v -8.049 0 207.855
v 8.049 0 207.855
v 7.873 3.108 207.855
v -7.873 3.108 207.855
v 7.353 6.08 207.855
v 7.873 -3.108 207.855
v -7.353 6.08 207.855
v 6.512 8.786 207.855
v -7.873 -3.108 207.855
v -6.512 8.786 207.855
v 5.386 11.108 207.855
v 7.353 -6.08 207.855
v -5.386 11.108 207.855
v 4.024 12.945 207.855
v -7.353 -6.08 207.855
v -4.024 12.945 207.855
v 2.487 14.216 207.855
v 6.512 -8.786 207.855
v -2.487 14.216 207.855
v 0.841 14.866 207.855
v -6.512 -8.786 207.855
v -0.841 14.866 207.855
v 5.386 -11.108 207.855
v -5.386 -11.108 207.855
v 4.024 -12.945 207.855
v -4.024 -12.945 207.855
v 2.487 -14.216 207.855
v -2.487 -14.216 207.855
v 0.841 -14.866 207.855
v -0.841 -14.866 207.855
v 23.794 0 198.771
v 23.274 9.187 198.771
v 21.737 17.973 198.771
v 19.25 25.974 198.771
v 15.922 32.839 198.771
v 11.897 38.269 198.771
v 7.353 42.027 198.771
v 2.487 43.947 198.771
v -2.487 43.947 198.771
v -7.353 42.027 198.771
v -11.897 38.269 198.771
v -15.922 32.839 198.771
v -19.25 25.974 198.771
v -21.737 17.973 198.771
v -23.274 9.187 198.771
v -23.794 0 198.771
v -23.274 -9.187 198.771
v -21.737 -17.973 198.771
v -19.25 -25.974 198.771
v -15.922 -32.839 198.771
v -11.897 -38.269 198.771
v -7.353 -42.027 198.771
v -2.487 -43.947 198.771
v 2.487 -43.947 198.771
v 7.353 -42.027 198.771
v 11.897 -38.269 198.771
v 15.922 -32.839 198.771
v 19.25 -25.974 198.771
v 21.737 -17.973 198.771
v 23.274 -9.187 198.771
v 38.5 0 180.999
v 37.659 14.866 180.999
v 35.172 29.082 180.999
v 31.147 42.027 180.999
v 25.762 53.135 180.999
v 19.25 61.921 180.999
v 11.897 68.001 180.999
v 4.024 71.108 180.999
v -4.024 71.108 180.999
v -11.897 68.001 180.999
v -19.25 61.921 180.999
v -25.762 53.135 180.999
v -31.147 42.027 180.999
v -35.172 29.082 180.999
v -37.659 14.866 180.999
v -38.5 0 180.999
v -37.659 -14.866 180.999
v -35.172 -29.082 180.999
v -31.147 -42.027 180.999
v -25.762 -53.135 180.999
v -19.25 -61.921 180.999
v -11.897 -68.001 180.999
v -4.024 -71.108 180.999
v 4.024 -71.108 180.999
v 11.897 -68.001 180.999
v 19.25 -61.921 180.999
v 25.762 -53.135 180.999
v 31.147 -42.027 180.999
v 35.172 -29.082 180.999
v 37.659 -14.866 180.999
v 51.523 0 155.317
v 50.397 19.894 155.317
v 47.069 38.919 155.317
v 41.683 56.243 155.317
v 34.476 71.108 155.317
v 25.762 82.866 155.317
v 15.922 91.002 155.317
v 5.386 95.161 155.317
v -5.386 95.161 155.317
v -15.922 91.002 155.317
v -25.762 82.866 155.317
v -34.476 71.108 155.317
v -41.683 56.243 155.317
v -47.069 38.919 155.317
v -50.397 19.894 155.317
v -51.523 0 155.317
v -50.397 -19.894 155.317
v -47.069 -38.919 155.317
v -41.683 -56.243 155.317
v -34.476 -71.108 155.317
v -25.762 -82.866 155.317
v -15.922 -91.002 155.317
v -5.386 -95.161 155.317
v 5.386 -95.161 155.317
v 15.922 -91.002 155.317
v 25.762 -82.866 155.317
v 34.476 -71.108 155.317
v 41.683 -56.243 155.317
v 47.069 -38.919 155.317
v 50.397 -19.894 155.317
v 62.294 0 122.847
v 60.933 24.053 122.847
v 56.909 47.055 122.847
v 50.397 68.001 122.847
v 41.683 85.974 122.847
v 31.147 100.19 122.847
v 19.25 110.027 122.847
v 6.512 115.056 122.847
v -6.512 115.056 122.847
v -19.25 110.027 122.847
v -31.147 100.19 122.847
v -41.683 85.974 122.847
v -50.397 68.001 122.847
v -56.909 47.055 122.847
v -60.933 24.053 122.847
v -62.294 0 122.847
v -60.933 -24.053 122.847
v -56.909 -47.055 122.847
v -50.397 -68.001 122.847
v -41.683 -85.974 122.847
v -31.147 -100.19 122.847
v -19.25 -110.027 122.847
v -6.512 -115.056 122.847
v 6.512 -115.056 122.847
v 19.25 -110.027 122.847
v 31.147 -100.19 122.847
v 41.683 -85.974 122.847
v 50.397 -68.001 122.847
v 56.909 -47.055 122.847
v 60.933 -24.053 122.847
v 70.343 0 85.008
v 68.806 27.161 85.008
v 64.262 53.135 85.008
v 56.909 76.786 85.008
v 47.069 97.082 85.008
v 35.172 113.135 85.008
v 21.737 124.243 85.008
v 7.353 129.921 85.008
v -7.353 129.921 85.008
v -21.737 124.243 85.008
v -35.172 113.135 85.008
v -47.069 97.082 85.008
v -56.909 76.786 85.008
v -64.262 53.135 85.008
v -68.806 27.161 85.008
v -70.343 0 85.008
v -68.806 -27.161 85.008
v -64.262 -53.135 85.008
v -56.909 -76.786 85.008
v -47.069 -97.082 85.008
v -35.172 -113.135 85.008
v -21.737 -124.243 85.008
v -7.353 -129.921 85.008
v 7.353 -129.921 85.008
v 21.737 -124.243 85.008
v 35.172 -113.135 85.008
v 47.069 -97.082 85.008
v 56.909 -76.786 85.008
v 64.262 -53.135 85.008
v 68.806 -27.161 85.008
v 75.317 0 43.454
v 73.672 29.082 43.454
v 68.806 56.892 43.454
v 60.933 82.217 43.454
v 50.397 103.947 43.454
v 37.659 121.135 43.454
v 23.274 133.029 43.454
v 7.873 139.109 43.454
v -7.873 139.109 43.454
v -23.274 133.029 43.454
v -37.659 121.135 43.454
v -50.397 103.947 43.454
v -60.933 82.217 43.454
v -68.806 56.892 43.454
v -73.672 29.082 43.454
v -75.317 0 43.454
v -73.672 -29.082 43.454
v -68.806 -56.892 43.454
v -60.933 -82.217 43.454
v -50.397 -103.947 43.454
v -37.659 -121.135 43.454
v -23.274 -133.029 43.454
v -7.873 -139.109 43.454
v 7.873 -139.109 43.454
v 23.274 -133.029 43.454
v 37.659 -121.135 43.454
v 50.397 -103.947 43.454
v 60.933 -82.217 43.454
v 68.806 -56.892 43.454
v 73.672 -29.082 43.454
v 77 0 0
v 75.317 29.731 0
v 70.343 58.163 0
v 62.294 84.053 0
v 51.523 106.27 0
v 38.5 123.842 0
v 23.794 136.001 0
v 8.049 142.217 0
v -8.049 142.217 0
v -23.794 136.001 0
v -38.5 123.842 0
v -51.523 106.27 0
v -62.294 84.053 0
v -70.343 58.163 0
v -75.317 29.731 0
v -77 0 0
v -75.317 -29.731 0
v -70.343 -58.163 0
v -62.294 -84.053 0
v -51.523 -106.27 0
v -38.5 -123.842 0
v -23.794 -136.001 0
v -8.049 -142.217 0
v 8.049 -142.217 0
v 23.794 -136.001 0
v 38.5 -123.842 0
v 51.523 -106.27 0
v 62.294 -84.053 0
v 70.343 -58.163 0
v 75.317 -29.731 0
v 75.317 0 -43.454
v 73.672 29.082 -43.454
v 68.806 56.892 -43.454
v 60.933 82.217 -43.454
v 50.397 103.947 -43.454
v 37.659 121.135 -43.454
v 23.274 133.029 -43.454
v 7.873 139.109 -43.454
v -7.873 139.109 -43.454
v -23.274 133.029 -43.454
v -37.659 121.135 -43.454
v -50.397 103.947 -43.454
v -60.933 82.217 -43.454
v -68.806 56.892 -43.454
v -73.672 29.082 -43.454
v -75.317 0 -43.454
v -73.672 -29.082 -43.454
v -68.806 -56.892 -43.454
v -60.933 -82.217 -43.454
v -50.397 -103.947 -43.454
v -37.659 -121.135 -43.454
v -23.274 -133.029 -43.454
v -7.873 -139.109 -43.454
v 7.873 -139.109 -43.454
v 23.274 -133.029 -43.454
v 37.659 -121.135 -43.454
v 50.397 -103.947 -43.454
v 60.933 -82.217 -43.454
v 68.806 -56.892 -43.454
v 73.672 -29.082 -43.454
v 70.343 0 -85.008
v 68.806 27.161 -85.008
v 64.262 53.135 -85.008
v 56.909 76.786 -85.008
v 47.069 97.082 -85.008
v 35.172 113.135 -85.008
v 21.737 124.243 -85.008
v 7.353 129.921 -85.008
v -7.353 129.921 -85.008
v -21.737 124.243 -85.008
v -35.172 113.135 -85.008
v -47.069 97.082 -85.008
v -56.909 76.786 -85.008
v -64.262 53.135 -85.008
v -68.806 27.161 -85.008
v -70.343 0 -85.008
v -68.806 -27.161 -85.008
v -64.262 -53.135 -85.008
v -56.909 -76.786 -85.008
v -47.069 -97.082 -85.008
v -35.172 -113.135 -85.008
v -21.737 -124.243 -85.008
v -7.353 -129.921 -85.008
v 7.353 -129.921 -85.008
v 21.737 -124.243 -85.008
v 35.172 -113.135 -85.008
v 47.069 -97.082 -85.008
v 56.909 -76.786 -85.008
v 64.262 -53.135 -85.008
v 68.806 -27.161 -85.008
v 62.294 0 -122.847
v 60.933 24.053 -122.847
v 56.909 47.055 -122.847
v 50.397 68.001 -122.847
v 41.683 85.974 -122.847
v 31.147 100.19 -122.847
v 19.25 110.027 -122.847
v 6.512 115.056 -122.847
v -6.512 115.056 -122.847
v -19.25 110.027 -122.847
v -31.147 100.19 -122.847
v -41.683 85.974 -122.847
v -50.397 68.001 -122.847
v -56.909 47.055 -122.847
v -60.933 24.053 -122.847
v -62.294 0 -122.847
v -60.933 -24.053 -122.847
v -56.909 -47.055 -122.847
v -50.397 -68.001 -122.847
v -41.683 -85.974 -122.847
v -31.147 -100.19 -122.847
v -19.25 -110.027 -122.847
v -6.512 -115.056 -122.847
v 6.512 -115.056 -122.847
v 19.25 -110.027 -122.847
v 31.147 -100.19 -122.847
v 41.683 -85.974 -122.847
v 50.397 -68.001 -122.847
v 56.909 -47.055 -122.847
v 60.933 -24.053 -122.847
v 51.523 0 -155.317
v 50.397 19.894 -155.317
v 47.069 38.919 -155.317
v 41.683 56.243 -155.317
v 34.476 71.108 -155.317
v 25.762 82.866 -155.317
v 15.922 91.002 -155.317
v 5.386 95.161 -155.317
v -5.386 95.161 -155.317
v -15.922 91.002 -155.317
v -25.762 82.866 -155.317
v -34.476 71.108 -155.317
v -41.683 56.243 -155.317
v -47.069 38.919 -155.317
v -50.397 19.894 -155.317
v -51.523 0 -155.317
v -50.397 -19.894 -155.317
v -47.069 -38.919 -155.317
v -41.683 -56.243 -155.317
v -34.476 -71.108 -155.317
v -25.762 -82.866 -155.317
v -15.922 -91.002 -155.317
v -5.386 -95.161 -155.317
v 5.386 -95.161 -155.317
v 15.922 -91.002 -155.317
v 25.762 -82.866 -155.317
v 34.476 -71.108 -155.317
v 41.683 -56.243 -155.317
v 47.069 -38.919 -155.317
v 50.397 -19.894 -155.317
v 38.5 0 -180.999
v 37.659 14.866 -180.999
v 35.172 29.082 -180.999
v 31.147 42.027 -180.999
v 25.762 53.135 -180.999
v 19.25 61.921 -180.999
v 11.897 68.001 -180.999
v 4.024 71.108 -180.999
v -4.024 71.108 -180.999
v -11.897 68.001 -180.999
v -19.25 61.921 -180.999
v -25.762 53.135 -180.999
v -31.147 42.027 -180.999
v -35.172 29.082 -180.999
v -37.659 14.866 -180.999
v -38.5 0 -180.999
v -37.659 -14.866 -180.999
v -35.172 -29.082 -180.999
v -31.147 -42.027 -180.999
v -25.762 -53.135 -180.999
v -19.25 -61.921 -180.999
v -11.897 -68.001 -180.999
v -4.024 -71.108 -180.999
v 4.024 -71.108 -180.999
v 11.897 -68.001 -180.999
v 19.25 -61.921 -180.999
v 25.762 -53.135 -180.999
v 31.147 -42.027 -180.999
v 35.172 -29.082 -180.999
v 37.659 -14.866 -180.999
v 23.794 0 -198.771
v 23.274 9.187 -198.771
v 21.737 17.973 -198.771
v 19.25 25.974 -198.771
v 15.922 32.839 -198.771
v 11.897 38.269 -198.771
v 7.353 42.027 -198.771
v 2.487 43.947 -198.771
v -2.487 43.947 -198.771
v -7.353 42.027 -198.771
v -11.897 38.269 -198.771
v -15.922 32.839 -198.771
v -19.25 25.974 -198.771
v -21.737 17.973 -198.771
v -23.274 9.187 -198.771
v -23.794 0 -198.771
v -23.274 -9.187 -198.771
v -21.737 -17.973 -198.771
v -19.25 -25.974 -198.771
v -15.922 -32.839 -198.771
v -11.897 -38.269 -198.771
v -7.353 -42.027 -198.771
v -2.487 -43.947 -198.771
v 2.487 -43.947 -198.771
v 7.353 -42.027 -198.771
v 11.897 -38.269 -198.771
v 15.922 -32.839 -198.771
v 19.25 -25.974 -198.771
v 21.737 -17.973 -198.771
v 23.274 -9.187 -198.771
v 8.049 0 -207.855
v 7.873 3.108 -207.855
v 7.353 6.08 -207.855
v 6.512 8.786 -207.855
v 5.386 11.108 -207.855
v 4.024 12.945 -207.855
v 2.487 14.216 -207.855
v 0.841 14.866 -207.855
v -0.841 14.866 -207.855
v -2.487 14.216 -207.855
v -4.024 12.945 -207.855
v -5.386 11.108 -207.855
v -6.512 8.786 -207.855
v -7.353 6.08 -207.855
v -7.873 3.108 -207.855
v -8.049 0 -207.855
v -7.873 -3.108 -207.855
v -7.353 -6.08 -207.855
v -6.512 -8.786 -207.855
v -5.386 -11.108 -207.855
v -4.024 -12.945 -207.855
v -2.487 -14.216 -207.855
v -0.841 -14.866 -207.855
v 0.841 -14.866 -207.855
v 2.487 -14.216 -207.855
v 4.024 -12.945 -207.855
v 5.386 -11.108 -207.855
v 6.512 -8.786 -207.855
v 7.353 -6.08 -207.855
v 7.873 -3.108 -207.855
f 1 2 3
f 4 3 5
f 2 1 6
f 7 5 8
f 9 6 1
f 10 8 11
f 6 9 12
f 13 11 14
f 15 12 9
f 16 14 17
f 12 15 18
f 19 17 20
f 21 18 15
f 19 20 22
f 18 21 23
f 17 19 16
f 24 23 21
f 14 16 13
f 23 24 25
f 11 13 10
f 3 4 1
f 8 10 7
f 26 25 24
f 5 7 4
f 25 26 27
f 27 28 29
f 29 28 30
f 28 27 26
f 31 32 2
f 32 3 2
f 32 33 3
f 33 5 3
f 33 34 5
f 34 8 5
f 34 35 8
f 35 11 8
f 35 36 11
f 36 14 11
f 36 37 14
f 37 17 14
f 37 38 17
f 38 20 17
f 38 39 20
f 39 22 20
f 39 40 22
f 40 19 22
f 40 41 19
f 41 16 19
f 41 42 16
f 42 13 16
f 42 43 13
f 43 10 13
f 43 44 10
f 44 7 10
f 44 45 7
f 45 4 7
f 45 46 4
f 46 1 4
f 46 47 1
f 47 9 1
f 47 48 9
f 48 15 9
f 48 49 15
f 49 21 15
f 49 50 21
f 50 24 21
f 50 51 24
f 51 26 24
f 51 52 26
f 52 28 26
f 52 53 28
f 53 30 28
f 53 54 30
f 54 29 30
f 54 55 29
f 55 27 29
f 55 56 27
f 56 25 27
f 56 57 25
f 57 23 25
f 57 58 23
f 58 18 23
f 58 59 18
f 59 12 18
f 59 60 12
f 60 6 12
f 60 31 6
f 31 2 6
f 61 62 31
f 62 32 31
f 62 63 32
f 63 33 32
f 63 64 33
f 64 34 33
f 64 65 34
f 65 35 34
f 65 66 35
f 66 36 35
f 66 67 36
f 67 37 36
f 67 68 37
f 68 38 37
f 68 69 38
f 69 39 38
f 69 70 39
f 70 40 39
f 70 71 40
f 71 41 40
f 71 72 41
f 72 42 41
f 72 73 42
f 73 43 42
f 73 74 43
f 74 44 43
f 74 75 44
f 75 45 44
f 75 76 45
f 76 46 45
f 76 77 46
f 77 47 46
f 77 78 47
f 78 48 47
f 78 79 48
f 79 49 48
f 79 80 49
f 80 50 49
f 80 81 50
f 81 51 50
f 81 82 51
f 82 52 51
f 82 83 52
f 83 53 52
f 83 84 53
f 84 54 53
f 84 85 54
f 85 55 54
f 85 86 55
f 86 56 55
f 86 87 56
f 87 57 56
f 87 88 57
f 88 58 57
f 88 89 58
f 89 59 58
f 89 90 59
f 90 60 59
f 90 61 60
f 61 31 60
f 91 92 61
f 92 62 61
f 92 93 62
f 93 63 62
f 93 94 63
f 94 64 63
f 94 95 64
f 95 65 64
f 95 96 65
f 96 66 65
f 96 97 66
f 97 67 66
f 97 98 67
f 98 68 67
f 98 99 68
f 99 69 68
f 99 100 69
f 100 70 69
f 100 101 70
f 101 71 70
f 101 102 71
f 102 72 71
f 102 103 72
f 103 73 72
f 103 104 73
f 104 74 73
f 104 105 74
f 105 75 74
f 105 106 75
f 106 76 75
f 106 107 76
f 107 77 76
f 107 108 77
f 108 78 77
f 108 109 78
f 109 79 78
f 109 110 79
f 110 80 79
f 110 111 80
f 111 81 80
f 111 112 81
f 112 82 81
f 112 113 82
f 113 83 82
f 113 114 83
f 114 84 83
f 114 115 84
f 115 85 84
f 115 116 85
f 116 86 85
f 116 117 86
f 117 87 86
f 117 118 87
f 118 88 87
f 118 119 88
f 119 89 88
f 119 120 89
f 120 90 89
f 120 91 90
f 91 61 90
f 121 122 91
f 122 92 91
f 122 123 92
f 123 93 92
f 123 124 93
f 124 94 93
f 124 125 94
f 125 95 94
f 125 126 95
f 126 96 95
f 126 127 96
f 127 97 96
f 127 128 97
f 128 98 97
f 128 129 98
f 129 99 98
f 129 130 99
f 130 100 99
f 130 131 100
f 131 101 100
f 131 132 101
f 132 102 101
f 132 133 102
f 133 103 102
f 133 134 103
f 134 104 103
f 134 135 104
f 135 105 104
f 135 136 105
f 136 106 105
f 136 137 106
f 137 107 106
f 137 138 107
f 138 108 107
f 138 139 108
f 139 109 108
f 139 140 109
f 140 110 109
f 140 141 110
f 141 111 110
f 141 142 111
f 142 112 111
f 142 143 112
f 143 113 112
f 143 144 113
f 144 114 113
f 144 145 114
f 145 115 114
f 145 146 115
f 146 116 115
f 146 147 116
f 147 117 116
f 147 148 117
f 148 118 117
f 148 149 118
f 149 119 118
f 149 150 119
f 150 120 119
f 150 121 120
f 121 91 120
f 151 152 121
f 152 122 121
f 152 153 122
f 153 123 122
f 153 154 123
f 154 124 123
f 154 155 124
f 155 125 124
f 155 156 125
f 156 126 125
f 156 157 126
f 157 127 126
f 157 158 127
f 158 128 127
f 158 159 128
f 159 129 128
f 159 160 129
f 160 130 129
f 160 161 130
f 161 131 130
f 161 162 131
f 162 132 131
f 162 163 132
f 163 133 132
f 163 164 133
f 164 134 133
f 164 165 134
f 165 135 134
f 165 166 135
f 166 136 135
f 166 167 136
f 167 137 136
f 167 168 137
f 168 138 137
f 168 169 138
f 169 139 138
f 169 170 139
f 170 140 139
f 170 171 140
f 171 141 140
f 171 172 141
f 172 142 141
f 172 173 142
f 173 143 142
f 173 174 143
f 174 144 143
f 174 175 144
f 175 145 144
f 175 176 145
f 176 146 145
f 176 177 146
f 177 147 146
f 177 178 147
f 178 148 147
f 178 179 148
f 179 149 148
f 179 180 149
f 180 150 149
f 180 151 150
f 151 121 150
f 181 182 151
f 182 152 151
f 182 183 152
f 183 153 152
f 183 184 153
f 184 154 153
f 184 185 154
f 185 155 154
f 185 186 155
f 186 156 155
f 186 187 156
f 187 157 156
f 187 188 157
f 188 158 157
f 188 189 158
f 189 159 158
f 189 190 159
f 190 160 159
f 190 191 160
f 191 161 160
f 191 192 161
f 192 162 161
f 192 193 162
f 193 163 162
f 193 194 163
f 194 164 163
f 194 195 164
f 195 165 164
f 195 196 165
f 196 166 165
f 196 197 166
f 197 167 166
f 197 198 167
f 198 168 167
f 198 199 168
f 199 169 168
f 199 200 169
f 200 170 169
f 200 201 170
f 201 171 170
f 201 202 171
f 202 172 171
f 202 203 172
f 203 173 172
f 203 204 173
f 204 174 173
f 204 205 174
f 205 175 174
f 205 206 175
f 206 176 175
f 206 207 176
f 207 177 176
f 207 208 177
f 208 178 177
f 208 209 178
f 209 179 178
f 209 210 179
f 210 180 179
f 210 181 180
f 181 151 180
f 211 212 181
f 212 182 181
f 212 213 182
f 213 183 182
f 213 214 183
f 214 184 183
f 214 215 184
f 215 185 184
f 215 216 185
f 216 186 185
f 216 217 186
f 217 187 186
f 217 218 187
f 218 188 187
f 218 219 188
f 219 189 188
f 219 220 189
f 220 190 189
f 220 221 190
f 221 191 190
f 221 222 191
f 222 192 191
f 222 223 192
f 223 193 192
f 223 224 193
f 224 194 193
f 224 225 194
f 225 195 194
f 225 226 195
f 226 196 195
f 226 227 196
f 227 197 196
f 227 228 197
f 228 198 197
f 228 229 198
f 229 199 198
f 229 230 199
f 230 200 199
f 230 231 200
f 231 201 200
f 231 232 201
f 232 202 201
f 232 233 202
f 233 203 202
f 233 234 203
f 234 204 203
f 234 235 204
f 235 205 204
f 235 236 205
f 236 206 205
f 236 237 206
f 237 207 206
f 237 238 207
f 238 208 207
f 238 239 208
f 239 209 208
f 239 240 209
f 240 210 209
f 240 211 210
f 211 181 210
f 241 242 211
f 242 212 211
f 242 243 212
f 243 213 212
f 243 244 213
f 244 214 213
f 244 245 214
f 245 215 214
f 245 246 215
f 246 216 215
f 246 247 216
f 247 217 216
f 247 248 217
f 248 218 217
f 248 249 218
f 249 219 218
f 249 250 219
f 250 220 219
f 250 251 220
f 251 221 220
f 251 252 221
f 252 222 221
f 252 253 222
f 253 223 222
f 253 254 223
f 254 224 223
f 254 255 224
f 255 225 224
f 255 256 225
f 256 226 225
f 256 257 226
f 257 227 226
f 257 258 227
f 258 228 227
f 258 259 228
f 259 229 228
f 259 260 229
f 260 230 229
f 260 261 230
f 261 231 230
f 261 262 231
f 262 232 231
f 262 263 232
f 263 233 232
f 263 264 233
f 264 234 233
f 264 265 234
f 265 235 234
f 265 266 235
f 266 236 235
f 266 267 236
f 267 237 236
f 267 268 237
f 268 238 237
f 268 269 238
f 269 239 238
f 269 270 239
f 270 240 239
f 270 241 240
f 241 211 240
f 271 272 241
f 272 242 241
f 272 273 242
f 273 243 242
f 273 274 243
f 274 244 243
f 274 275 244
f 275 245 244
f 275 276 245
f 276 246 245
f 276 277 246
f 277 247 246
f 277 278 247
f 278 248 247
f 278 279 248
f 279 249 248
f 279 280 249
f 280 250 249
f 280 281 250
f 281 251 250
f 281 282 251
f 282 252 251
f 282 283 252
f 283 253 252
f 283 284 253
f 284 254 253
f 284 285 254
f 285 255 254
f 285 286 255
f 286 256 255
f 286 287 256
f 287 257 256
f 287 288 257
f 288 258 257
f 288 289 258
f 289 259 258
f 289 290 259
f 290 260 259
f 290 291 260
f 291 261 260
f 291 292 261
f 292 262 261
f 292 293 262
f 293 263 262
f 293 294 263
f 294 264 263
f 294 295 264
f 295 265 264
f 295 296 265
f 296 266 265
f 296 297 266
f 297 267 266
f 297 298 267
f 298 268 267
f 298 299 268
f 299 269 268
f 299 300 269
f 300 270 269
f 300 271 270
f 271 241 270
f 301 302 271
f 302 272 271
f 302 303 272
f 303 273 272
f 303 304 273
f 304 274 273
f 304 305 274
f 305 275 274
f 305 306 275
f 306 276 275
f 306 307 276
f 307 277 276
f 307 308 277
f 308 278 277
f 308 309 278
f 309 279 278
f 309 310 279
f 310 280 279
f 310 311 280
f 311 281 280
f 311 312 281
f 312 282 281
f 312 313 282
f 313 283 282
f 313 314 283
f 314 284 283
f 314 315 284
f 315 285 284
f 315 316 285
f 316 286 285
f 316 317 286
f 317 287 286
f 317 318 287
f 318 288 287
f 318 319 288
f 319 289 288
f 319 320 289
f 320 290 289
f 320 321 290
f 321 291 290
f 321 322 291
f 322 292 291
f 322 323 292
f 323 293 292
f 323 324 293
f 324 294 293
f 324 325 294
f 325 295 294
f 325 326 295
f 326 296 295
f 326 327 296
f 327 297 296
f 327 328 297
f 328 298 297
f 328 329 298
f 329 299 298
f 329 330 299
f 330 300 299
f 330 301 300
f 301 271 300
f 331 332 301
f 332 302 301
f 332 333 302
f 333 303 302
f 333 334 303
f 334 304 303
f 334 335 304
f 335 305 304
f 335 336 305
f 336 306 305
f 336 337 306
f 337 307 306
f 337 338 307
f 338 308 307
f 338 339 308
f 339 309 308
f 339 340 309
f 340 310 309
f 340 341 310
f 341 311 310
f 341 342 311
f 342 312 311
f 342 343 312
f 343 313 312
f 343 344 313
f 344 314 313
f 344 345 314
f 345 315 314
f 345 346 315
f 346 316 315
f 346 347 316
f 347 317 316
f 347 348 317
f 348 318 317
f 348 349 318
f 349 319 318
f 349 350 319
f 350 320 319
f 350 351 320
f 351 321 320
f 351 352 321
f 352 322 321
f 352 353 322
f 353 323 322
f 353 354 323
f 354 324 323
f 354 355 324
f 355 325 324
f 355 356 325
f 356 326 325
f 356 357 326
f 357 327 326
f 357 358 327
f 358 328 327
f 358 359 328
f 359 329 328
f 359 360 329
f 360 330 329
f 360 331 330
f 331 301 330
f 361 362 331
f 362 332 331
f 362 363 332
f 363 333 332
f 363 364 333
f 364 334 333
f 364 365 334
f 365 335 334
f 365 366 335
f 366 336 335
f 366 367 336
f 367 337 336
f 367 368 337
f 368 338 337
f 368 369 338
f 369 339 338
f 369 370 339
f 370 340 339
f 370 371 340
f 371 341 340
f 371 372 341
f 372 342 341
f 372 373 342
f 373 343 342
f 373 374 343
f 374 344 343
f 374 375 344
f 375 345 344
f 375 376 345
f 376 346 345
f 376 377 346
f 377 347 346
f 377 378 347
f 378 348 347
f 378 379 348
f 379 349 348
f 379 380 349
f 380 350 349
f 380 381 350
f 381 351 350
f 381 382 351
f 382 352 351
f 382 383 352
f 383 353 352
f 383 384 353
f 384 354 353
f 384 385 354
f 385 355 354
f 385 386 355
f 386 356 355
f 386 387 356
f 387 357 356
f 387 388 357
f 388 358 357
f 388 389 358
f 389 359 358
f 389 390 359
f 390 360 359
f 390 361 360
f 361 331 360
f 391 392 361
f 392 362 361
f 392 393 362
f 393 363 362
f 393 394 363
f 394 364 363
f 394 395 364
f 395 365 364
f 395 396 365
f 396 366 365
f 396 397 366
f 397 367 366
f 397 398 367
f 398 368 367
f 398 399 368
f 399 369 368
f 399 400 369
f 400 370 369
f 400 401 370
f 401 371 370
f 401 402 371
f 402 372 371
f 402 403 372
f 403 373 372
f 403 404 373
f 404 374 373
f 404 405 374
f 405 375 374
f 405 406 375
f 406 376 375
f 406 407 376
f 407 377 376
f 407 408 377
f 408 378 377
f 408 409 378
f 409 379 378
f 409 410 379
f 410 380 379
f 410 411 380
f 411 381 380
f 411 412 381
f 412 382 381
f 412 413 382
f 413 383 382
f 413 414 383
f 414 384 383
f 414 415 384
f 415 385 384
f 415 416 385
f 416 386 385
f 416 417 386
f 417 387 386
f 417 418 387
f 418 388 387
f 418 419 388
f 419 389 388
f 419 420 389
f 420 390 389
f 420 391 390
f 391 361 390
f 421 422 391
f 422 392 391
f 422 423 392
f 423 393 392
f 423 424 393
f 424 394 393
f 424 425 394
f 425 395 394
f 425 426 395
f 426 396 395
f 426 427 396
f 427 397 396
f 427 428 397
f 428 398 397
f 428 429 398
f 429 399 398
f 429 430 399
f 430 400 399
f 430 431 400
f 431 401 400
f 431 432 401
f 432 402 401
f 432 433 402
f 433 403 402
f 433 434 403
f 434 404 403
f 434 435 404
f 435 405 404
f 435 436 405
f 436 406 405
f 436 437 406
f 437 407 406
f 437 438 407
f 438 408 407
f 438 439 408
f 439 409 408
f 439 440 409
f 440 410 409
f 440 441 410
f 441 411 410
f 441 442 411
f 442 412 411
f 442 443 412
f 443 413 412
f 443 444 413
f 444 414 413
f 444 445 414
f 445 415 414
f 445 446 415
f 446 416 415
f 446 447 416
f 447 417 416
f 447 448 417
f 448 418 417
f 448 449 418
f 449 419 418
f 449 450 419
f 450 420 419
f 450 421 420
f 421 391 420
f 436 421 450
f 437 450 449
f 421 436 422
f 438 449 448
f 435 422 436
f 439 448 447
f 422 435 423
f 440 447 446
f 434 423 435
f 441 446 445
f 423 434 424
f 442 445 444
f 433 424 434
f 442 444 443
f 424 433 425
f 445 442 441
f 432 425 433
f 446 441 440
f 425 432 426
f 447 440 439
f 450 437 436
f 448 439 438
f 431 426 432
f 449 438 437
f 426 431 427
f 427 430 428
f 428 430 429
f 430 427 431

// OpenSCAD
// Generated by SolidPython 1.0.1 on 2020-07-29 00:46:47


scale(v = [7, 13, 19]) {
	sphere(r = 11);
}
/***********************************************
*********      SolidPython code:      **********
************************************************
 
# import packages: SolidPython
from solid import *
from solid.utils import *
from itertools import chain, combinations, permutations


class Resize:

    def __init__(self, scad_file):
        self.scad_file = scad_file
        #self.scad_file = import_scad(scad_file)
        # cone/cylinder param:
        self.r1 = 0
        self.r2 = 0
        self.h = 0
        # rectangular prism param:
        self.w = 0
        self.l = 0
        # ellipse param:
        self.r = 0

    # import OpenScad code (file name corresponds to shape)


    # classify shape + parameters
    def assign(self, param1, param2, param3):
        if self.scad_file == 'cone.scad':
            self.r1 = param1
            self.r2 = param2
            self.h = param3
        elif self.scad_file == 'cylinder.scad':
            self.r1 = param1
            self.r2 = param2
            self.h = param3
        elif self.scad_file == 'rectangularPrism.scad':
            self.h = param1
            self.l = param2
            self.w = param3
        else:
            self.r = param1
            self.h = param2

    # resize parameters
    def iterate(self):
        x = range(3, 20, 2)
        i = 1
        if self.scad_file == 'cone.scad':
            tempList = list(permutations(x, 2))
            for temp in tempList:
                param1 = temp[0]
                param2 = temp[1]
                filepath = 'produced_scad_files/' + 'cone' + str(param1) + '_' + str(param2) + '_' + '.scad'
                scad_render_to_file(cylinder(h=param1, r1=param2, r2=0), filepath)

        elif self.scad_file == 'cylinder.scad':
            tempList = list(permutations(x, 3))
            for temp in tempList:
                param1 = temp[0]
                param2 = temp[1]
                filepath = 'produced_scad_files/' + 'cylinder' + str(param1) + '_' + str(param2) + '_' + '.scad'
                scad_render_to_file(cylinder(h=param1, r1=param2, r2=param2), filepath)

        elif self.scad_file == 'rectangularPrism.scad':
            tempList = list(permutations(x, 3))
            for temp in tempList:
                param1 = temp[0]
                param2 = temp[1]
                param3 = temp[2]
                filepath = 'produced_scad_files/' + 'rectangularPrism' + str(param1) + '_' + str(param2) + '_' + str(
                    param3) + '.scad'
                scad_render_to_file(cube(size=(param1, param2, param3)), filepath)

        elif self.scad_file == 'ellipse.scad':
            tempList = list(permutations(x, 4))
            for temp in tempList:
                param1 = temp[0]
                param2 = temp[1]
                param3 = temp[2]
                param4 = temp[3]
                filepath = 'produced_scad_files/' + 'ellipse' + str(param1) + '_' + str(param2) + '_' + str(param3) + '_' + str(param4) + '.scad'
                scad_render_to_file(scale([param1, param2, param3])(sphere(r=param4)), filepath)

    def render_to_scadfile(self):
        scad_render_to_file(scad, 'example.scad') 
 
************************************************/
